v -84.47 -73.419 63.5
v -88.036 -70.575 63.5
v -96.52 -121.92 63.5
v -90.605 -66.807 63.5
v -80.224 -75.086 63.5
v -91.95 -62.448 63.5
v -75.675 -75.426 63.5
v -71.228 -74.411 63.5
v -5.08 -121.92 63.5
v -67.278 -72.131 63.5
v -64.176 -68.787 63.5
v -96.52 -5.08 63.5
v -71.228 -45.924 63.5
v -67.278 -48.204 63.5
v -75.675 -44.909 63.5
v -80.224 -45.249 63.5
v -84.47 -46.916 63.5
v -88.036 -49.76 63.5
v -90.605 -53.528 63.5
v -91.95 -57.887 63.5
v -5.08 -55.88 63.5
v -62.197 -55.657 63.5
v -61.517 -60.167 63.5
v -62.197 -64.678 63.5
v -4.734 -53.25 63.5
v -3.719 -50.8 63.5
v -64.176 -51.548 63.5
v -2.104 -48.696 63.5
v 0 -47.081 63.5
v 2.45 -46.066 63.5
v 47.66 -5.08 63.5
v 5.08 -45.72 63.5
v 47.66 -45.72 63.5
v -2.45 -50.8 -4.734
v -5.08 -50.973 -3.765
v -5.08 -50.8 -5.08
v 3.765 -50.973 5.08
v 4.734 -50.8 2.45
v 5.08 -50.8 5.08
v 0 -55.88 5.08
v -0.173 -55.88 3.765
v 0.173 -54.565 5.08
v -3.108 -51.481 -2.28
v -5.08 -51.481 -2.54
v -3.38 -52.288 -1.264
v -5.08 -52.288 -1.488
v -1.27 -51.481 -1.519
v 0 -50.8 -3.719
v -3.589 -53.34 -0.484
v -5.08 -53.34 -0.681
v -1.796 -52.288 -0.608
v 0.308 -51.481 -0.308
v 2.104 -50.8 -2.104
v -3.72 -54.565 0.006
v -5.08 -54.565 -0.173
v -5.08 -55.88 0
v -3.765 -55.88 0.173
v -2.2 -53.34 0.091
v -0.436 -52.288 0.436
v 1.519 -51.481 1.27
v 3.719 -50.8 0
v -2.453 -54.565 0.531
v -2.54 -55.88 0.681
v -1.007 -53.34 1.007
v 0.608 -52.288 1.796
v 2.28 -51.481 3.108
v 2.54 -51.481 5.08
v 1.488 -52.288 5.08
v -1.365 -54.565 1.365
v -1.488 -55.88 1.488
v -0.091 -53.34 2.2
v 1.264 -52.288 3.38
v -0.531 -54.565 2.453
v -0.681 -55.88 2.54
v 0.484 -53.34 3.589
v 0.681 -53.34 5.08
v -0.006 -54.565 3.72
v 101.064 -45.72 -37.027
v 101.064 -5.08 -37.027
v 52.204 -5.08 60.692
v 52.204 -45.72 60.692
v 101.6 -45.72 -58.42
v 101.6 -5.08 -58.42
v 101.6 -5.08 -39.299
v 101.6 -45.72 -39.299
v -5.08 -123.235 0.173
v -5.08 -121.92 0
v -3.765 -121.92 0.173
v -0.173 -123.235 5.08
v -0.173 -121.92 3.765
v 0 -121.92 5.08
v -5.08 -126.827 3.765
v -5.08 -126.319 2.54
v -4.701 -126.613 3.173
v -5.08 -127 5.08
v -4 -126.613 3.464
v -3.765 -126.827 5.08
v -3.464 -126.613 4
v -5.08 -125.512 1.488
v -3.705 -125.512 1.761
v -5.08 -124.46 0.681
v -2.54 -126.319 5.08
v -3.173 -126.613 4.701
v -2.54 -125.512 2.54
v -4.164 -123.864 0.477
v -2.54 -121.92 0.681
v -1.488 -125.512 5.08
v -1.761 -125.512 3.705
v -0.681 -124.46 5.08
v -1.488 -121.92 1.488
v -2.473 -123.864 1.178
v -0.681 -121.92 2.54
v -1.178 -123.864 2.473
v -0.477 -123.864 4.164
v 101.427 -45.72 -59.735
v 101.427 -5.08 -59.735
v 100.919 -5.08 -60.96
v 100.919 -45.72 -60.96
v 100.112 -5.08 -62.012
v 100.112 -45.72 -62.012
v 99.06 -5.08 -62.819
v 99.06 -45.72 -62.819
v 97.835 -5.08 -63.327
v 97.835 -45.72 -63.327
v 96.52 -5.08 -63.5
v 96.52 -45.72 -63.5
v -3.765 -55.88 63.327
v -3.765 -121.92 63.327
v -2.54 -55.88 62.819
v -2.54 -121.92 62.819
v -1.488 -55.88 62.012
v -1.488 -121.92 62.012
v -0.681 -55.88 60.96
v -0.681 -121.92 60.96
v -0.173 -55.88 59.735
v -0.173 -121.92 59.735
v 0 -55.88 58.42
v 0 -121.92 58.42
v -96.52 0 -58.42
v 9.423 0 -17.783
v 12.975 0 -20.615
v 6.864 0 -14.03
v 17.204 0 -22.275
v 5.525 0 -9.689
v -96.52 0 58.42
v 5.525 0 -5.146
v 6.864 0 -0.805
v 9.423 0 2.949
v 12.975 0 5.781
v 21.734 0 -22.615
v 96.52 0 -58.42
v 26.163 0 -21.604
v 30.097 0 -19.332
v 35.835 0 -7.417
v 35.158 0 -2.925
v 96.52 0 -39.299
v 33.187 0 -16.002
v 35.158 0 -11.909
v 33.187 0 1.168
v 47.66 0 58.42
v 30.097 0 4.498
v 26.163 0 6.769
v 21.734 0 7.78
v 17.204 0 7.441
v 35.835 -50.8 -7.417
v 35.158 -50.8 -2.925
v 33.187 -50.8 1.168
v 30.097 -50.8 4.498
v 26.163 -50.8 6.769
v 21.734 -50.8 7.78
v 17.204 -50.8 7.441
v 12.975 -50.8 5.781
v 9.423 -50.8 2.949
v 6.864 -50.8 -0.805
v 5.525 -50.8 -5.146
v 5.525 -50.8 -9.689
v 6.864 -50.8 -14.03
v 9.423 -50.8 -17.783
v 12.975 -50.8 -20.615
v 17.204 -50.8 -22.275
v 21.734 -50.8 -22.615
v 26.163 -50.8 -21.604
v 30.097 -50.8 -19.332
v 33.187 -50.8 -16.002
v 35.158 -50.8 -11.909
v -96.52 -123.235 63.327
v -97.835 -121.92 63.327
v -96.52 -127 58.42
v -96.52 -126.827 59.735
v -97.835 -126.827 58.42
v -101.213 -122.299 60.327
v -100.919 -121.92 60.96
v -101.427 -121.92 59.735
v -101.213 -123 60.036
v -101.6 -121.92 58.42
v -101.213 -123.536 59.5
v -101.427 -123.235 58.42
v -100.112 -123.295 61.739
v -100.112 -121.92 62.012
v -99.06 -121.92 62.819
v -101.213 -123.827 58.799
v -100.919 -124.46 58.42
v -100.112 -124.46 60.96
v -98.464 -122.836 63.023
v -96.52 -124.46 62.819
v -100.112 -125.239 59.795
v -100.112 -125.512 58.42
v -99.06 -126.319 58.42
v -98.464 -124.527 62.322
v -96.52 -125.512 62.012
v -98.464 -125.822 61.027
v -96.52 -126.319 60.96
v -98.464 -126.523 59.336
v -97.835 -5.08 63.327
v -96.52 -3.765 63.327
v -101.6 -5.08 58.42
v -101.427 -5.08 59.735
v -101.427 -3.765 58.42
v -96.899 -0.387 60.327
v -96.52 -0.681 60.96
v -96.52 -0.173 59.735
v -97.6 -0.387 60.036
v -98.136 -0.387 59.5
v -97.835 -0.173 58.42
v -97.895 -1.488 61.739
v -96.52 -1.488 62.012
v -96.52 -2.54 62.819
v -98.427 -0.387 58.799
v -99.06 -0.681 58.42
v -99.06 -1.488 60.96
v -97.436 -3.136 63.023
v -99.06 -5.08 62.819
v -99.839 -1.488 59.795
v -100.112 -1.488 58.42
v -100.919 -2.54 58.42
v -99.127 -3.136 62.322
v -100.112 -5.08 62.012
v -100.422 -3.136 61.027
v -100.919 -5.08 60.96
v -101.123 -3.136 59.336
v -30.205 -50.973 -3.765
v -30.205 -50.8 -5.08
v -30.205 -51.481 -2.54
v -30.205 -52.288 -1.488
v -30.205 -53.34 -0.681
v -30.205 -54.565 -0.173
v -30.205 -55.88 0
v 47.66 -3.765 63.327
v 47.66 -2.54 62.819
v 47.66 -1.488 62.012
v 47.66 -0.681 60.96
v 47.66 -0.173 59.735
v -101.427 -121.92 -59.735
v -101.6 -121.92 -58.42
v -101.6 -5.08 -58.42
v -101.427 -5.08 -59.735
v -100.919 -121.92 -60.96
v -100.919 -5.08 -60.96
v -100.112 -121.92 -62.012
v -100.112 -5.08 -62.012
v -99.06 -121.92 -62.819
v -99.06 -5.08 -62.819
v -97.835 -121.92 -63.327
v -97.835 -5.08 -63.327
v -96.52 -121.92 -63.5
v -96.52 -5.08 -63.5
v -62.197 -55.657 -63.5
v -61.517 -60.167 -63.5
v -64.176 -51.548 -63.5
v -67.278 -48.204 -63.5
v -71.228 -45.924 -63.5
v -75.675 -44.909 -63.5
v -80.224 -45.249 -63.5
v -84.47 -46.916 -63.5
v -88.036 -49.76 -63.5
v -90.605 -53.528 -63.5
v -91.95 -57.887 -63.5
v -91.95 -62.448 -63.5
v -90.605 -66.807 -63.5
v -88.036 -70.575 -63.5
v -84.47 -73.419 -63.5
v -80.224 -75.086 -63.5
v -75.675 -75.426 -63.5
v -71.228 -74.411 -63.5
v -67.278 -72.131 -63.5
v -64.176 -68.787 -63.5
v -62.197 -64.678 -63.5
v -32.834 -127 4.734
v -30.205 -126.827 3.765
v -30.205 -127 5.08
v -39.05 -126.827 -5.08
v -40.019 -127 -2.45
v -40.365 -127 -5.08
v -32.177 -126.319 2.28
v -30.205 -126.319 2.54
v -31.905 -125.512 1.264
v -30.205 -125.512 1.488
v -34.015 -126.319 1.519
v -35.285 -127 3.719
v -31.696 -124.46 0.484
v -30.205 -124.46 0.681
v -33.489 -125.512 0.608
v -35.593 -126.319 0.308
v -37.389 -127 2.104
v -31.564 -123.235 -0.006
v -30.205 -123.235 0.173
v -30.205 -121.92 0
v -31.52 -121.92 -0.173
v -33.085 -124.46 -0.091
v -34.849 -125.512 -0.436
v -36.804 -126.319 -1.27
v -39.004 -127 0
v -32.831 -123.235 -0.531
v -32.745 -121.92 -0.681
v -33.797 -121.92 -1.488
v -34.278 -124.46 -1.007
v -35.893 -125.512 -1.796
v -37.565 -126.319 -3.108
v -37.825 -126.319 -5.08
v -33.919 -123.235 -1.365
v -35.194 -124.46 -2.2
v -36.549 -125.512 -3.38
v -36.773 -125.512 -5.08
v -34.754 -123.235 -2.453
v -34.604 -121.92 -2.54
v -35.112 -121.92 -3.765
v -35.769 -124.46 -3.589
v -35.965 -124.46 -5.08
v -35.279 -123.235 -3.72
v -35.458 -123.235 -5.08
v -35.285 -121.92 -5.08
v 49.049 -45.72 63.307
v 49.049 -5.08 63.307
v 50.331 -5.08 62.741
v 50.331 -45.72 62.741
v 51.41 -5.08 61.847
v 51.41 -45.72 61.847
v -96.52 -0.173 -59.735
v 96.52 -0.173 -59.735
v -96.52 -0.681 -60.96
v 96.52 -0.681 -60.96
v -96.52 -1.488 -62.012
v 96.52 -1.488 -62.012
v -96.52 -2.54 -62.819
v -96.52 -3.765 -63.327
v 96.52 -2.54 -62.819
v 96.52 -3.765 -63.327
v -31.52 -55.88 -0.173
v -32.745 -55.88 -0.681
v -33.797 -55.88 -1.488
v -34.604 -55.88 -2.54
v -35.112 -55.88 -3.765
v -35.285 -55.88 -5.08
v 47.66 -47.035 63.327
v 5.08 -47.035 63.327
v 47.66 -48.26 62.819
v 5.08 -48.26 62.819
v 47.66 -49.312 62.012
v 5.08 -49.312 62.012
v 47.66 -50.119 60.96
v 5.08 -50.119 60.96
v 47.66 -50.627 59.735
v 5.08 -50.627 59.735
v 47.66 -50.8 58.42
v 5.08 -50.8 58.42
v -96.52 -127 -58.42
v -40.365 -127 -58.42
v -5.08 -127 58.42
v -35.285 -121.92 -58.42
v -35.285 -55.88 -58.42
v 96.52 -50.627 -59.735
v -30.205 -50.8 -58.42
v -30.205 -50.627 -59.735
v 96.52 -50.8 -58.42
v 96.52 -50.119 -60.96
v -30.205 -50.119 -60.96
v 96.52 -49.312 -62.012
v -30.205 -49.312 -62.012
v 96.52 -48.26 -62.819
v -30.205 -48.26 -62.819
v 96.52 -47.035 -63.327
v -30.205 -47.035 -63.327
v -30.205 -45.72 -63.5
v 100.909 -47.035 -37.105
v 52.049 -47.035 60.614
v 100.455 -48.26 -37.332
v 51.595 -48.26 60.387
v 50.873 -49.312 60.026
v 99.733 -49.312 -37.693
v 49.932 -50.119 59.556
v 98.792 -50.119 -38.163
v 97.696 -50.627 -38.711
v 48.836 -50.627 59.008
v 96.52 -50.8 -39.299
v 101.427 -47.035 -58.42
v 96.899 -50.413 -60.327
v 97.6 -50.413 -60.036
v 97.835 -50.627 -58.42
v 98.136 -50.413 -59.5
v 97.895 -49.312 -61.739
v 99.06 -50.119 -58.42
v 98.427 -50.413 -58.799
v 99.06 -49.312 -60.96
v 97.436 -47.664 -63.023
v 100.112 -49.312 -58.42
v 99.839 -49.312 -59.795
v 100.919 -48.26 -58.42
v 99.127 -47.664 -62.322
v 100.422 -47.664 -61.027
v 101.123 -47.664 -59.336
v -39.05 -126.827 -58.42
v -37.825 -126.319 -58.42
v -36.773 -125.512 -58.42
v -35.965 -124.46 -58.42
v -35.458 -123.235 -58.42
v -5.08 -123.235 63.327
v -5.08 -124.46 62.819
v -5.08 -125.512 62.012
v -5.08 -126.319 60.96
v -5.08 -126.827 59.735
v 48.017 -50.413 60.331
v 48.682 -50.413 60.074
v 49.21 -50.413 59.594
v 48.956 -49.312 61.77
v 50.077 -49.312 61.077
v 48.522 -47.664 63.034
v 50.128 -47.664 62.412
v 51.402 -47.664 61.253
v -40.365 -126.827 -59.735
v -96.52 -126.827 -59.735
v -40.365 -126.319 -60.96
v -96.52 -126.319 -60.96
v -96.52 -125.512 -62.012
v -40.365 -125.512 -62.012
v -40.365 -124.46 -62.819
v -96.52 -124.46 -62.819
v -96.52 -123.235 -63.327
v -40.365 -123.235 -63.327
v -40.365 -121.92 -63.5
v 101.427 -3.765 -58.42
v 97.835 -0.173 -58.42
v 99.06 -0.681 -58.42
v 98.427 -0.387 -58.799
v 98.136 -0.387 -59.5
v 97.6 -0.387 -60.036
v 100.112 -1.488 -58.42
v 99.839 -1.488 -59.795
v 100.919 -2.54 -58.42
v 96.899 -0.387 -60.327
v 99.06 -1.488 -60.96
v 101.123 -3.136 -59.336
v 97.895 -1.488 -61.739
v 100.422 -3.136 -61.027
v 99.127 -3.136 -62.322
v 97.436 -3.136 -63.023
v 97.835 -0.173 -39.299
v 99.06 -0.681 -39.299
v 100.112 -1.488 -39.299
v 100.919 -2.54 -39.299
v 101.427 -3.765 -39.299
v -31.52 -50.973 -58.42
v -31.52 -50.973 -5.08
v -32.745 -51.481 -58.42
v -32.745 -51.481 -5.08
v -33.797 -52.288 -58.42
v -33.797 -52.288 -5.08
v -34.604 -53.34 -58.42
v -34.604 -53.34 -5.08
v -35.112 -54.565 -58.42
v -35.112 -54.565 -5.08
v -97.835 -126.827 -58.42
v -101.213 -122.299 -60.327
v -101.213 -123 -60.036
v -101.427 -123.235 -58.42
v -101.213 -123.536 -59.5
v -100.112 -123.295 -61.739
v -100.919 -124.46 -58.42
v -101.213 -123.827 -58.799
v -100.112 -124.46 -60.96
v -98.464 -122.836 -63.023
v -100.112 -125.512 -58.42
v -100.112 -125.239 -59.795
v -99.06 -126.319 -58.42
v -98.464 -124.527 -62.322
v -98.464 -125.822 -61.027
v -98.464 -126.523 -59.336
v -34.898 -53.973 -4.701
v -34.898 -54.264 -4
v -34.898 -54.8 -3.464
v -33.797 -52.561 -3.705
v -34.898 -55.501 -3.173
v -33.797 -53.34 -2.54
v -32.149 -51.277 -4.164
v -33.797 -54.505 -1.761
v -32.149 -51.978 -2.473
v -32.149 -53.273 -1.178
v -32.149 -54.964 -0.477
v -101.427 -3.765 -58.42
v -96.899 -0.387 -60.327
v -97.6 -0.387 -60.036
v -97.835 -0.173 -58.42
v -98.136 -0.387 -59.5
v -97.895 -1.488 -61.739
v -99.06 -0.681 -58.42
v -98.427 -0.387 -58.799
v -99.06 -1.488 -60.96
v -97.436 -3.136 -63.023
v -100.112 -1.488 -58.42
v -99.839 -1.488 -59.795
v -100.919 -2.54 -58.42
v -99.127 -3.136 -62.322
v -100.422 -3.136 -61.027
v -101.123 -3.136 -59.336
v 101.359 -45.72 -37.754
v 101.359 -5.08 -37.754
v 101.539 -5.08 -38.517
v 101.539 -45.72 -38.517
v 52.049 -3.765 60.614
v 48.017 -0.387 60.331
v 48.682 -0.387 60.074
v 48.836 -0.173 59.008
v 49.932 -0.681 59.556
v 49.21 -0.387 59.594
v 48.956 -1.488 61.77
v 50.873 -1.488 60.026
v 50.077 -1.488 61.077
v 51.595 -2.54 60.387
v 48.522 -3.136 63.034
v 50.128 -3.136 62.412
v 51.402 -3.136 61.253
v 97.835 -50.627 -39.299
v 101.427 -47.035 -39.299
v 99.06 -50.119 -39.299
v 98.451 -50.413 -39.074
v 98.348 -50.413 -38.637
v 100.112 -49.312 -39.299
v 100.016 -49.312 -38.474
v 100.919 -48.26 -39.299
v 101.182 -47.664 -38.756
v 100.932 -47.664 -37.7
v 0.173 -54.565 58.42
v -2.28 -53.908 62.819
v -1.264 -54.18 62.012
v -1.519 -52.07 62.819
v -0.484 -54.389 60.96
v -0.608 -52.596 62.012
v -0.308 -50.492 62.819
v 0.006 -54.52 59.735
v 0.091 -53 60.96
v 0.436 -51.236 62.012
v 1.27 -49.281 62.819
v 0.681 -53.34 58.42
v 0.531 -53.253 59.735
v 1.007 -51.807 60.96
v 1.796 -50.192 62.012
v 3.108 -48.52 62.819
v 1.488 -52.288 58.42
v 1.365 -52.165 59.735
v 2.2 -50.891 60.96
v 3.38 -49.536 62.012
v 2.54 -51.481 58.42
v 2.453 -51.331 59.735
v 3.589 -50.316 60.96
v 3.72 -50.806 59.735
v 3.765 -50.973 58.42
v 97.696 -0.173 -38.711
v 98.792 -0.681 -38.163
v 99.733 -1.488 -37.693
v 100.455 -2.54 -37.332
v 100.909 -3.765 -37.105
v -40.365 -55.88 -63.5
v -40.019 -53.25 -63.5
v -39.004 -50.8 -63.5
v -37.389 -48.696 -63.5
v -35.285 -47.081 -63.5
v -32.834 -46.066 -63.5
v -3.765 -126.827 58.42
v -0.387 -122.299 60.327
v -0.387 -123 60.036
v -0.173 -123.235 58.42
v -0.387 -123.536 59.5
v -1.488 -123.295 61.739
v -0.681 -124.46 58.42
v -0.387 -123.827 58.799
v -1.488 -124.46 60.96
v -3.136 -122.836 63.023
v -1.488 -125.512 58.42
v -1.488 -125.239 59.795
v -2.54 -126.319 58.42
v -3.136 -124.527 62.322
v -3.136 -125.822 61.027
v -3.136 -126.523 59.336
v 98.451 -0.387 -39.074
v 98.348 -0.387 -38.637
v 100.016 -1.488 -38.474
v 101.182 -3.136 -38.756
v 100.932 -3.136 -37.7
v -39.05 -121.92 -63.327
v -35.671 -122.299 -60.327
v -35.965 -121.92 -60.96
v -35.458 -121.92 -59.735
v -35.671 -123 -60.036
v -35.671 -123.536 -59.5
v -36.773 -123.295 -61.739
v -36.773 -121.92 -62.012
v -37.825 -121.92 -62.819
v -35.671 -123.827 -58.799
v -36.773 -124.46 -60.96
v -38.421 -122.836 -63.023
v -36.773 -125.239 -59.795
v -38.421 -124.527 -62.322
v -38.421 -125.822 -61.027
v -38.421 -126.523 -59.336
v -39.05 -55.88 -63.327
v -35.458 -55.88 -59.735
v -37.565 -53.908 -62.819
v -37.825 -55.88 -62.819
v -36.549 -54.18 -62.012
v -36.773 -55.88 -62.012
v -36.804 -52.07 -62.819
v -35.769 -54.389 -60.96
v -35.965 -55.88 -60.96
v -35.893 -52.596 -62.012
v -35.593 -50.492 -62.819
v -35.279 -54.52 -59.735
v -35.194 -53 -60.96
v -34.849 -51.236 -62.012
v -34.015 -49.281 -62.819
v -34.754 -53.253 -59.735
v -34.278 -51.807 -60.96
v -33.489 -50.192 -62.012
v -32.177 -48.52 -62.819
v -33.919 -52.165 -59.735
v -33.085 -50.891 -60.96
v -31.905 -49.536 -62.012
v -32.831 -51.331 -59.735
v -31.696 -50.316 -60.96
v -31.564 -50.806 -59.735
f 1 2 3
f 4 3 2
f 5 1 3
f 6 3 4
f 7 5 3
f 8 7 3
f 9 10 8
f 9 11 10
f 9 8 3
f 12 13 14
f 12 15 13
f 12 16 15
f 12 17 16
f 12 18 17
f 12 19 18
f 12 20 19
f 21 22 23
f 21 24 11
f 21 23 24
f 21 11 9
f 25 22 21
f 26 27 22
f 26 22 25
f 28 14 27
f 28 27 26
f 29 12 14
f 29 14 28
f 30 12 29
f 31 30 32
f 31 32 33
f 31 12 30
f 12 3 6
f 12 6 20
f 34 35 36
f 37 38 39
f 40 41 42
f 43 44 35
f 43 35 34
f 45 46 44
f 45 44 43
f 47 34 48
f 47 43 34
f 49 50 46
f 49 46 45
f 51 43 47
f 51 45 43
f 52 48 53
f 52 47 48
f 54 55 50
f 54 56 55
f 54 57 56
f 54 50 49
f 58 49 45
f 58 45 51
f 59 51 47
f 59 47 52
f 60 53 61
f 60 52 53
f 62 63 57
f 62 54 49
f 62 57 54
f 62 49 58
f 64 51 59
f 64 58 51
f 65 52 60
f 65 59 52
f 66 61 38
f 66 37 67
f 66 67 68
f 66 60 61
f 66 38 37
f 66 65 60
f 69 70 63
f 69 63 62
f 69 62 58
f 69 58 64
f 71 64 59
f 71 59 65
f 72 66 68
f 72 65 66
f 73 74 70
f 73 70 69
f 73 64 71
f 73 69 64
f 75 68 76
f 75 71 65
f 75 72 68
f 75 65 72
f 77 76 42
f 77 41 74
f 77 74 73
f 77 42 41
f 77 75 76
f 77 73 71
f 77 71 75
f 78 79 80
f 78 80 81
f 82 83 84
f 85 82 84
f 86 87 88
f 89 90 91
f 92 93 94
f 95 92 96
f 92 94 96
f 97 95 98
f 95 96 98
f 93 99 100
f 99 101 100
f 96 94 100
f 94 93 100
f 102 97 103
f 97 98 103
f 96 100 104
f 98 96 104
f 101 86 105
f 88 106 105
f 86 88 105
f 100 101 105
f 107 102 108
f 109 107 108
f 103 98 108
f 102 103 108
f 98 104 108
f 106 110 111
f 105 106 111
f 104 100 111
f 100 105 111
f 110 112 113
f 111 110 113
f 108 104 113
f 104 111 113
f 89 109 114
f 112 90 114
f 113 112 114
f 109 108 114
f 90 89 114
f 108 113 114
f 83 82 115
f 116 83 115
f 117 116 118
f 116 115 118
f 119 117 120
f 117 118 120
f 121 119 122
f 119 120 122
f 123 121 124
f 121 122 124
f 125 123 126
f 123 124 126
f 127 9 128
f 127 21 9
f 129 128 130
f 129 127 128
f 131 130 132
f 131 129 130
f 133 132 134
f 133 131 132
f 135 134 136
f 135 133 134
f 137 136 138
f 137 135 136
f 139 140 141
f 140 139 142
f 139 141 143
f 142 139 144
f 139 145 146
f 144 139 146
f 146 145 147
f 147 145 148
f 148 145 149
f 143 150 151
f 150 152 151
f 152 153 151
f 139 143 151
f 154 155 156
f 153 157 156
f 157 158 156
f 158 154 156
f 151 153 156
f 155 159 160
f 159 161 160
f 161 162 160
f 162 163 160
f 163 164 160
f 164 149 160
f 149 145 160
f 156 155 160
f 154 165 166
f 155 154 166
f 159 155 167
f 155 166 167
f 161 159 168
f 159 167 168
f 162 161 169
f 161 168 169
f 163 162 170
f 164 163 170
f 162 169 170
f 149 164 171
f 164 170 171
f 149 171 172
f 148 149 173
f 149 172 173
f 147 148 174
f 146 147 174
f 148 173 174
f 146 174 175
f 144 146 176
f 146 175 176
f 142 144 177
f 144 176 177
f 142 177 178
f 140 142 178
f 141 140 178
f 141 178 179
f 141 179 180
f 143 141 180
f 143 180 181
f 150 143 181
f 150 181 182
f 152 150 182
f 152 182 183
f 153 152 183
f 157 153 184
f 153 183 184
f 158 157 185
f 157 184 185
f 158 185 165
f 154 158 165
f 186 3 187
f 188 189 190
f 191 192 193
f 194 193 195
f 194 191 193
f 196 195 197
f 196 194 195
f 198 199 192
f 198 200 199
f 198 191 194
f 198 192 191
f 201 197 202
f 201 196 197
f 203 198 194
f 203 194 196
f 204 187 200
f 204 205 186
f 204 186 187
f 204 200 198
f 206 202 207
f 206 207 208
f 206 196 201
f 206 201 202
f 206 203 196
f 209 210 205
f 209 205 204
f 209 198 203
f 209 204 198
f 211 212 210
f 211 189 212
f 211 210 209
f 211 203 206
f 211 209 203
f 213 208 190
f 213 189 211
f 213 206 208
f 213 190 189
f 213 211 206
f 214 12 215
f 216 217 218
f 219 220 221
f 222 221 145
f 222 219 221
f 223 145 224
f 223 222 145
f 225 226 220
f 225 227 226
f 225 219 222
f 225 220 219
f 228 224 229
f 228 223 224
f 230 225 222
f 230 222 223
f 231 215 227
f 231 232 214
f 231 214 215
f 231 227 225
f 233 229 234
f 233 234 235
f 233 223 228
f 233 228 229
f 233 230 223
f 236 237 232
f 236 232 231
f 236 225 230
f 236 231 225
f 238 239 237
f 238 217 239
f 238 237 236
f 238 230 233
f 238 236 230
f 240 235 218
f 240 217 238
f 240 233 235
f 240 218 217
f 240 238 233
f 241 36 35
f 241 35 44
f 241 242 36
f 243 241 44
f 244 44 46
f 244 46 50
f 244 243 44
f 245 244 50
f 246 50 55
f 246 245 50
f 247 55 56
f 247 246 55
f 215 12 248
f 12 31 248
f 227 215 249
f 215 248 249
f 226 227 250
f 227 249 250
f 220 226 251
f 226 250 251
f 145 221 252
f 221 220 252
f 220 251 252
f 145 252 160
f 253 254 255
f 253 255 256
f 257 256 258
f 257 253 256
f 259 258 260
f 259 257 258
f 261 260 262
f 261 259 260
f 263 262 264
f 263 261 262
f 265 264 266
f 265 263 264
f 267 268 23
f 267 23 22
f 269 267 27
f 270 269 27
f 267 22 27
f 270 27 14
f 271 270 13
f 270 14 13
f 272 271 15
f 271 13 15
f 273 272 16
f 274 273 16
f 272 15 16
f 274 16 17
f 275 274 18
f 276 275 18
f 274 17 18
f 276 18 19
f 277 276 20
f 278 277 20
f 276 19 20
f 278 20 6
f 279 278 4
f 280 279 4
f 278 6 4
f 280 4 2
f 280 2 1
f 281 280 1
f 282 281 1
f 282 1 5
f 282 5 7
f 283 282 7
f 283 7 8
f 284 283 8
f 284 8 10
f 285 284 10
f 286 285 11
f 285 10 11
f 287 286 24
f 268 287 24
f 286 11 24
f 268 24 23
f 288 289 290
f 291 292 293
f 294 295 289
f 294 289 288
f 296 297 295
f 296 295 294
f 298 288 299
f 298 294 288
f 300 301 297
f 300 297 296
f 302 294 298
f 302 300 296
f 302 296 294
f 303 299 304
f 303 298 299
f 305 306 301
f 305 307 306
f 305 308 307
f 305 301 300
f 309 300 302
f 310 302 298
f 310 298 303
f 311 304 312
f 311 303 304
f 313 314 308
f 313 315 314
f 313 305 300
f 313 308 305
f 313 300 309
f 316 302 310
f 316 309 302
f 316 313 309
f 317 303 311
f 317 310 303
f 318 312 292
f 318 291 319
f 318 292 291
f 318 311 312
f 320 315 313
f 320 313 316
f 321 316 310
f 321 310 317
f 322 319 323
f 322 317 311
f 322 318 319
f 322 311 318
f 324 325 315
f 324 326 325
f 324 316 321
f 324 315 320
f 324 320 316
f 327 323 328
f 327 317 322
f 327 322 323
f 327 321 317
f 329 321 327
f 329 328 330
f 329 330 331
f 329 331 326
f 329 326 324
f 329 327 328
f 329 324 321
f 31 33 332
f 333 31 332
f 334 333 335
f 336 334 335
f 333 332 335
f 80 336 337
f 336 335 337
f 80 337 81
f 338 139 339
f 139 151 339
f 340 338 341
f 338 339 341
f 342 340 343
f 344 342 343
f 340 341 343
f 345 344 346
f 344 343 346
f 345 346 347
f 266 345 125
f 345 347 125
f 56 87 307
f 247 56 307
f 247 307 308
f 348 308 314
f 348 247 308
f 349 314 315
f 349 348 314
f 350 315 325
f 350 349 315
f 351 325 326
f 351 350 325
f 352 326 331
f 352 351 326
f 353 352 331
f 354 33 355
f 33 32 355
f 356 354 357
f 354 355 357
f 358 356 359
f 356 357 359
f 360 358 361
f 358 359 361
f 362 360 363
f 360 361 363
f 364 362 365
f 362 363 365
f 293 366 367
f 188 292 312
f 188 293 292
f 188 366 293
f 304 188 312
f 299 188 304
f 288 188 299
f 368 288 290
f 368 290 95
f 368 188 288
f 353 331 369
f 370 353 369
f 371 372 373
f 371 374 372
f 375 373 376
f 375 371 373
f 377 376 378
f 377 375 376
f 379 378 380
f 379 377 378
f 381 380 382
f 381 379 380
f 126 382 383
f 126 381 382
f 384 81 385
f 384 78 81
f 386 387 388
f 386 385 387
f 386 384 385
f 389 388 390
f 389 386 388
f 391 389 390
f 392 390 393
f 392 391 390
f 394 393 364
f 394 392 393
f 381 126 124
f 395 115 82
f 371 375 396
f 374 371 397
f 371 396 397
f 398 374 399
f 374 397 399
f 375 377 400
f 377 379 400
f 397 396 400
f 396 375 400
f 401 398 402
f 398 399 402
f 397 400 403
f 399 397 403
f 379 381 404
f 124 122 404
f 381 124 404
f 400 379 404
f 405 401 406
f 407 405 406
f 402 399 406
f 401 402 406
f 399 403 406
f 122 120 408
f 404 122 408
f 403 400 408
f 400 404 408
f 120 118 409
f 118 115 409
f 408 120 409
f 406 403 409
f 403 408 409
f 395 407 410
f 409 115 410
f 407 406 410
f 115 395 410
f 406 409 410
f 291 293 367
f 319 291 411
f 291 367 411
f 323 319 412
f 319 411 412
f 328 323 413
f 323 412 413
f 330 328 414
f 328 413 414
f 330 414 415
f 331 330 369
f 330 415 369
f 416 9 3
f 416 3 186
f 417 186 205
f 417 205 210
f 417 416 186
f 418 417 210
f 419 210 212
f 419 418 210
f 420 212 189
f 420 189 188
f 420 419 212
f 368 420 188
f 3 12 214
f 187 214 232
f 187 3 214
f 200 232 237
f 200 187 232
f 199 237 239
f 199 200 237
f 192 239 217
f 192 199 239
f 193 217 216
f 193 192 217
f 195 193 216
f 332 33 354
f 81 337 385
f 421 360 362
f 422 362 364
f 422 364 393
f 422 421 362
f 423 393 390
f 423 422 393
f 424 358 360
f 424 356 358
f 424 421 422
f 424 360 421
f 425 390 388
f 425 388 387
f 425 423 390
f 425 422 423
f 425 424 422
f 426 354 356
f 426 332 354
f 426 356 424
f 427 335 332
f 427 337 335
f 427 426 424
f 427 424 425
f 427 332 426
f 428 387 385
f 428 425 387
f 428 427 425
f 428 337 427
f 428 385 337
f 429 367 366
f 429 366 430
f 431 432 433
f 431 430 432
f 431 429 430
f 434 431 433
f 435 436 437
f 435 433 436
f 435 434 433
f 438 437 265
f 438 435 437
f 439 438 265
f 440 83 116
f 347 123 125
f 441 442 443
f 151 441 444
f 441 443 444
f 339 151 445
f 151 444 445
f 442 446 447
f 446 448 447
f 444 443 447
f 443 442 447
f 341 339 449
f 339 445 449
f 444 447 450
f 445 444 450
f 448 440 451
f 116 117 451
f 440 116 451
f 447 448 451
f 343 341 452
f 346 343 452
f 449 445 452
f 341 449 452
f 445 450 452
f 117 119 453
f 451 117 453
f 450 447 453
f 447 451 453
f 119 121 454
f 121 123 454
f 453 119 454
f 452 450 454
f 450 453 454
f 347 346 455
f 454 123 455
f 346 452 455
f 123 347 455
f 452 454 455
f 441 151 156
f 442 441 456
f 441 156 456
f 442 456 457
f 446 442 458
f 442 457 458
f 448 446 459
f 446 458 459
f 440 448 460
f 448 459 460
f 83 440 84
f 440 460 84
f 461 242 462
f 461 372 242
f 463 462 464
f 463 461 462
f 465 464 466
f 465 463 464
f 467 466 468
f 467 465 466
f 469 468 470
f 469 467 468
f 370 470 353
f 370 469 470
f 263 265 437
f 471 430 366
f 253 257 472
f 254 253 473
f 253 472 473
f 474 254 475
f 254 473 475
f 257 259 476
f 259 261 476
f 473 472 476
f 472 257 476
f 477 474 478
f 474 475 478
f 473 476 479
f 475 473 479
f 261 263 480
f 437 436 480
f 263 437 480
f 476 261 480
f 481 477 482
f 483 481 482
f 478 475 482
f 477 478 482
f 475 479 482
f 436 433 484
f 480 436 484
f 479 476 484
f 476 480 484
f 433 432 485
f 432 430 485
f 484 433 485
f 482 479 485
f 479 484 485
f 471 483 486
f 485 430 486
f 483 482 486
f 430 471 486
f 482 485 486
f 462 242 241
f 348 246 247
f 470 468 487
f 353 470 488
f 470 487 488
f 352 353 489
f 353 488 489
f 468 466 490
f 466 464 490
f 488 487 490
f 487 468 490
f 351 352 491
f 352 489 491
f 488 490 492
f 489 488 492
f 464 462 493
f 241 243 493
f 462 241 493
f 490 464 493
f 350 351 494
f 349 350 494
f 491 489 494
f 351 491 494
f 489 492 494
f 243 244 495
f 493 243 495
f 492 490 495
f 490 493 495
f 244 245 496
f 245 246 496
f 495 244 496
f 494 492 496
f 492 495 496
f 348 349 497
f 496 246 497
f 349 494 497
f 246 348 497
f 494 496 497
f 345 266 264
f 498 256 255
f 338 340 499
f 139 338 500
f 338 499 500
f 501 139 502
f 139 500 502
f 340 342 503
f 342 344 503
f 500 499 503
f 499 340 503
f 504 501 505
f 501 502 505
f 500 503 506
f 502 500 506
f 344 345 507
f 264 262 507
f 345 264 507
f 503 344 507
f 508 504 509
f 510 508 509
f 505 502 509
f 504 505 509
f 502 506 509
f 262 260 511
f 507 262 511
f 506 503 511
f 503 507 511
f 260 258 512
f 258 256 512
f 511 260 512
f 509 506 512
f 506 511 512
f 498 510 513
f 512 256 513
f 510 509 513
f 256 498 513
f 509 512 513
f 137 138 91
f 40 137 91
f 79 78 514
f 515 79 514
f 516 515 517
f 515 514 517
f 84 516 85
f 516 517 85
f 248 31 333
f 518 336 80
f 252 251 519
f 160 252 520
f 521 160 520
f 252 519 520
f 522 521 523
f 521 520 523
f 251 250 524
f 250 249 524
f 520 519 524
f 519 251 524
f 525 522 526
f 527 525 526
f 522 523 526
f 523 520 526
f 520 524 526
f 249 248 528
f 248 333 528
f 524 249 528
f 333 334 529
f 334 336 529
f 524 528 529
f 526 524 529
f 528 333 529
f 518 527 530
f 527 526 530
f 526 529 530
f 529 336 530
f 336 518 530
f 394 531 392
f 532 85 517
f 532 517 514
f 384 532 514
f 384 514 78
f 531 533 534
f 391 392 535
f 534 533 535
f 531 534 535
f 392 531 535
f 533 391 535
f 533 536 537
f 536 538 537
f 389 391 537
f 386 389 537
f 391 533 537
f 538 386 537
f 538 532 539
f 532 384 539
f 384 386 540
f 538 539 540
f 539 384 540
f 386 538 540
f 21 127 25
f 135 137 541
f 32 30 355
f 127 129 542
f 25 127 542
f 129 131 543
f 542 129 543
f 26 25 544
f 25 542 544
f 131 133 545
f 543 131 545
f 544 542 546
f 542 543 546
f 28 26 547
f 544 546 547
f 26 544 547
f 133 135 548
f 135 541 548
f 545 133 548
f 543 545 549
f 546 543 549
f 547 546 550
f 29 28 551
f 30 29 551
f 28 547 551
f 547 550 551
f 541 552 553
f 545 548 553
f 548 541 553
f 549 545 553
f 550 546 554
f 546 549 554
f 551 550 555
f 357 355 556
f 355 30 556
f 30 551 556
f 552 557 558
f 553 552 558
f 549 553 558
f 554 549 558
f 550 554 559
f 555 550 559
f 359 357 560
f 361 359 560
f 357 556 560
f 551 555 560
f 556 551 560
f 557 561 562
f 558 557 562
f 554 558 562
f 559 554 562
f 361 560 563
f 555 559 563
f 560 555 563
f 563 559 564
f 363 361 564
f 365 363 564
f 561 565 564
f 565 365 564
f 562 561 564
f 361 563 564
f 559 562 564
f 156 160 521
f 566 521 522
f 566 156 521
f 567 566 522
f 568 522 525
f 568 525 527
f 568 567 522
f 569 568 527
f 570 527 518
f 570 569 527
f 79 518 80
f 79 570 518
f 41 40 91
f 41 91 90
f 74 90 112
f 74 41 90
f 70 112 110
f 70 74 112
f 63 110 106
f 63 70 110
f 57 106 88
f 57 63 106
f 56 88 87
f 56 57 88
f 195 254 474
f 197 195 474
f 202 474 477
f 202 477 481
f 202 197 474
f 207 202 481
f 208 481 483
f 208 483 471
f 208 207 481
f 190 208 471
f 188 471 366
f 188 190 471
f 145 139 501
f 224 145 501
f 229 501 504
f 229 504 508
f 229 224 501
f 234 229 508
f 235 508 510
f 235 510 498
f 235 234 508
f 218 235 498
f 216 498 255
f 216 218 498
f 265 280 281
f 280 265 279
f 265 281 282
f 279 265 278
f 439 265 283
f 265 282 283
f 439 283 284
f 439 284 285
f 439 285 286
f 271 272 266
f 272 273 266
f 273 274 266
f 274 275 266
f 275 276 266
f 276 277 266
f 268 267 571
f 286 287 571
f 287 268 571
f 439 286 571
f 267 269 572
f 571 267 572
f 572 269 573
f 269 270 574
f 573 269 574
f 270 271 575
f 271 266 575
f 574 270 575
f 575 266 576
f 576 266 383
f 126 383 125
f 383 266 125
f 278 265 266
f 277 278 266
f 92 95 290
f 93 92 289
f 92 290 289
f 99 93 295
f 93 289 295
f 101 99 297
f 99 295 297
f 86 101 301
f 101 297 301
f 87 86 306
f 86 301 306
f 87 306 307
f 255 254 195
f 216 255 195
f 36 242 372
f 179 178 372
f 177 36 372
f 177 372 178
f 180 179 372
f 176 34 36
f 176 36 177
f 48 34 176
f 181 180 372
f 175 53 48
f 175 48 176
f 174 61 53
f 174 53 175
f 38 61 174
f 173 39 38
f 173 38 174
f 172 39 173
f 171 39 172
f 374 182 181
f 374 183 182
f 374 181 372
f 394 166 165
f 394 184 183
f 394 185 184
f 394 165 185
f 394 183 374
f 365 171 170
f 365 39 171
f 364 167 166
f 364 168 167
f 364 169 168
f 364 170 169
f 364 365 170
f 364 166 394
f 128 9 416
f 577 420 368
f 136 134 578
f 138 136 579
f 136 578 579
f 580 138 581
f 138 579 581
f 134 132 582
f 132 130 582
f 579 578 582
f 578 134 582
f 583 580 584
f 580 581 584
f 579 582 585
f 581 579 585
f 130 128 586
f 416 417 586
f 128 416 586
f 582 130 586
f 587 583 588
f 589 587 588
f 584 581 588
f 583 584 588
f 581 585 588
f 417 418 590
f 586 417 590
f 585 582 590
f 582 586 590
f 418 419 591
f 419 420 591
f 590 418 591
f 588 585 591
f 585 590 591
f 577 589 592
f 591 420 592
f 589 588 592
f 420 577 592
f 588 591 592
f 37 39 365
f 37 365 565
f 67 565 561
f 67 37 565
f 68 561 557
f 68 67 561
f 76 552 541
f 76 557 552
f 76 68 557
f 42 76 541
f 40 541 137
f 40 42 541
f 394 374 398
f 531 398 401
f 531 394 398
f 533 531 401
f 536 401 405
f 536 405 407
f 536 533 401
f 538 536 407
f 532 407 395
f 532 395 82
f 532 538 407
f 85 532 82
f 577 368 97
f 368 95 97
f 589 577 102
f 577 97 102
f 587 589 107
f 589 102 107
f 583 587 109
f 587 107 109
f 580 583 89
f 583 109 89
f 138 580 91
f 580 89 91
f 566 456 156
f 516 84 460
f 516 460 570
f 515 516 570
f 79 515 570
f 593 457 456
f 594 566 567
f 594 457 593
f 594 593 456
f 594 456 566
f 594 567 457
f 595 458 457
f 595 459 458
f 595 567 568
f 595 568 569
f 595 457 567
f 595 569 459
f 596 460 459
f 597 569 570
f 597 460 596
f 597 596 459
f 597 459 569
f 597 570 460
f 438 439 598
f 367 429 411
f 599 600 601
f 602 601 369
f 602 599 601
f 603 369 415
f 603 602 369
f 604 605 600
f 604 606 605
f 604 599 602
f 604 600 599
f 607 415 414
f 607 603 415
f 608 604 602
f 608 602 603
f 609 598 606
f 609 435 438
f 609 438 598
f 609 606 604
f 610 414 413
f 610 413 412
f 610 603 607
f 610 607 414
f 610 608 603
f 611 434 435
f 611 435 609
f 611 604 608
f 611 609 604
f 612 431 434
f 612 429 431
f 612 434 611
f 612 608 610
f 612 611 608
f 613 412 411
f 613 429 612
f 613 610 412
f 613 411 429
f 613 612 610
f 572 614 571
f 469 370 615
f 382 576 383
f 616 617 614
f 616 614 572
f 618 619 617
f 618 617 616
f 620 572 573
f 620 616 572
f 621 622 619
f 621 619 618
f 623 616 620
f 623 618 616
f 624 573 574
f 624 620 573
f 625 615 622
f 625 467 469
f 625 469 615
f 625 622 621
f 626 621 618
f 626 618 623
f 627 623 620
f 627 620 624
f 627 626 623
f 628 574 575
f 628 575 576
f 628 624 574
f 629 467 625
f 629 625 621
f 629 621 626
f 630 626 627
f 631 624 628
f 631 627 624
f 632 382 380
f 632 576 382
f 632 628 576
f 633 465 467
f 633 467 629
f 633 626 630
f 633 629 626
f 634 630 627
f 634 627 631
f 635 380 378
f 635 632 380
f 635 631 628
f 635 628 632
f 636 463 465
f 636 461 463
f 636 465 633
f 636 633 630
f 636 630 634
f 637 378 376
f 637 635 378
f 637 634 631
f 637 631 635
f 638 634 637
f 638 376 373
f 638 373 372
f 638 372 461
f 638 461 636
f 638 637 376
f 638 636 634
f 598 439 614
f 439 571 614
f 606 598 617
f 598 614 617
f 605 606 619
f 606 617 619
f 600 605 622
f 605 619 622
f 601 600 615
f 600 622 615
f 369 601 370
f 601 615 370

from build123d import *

# Parameters (mm, degrees)
F0_W     = 203.2
F0_H     = 127
F1_DEPTH = 127
F3_DEPTH = 76.2
F4_SIZE2 = 101.6
F4_SIZE  = 50.8
F5_R     = 5.08
F6_R     = 15.24
F7_DEPTH = 50.8
F8_R     = 15.301727391
F9_DEPTH = 127


with BuildPart() as f1:
    # F0 (on Front) → F1 (new body)
    with BuildSketch(Plane.XZ):
        Rectangle(F0_W, F0_H)
    extrude(amount=F1_DEPTH)

    # F2 (on face) → F3 (cut)
    with BuildSketch(Plane.XZ.offset(127)):
        Polygon((101.6, 63.5), (0, 63.5), (0, 0), (-35.2848060429, 0), (-35.2848060429, -63.5), (101.6, -63.5), align=None)
    extrude(amount=-F3_DEPTH, mode=Mode.SUBTRACT)

    # F4
    f4_edges = [f1.edges().sort_by_distance(p)[0] for p in [
        (101.6, -25.4, 63.5),
    ]]
    f4_side = f1.faces().sort_by_distance((-21.771429, -52.614286, 63.5))[0]
    chamfer(f4_edges, length=F4_SIZE, length2=F4_SIZE2, reference=f4_side)

    # F5
    f5_edges = [f1.edges().sort_by_distance(p)[0] for p in [
        (-50.8, -127, 63.5),
        (0, -88.9, 63.5),
        (76.2, -50.8, 12.7),
        (-101.6, -63.5, 63.5),
        (-25.4, 0, 63.5),
        (76.2, 0, 12.7),
        (-68.442403, -127, -63.5),
        (101.6, -25.4, -63.5),
        (50.8, -25.4, 63.5),
        (25.4, -50.8, 63.5),
        (0, -88.9, 0),
        (-35.284806, -88.9, -63.5),
        (-17.642403, -127, 0),
        (33.157597, -50.8, -63.5),
        (101.6, -25.4, -38.1),
        (-101.6, -63.5, -63.5),
        (101.6, 0, -50.8),
        (-17.642403, -50.8, 0),
        (0, -127, 31.75),
        (-35.284806, -127, -31.75),
        (0, 0, -63.5),
        (0, -50.8, 31.75),
        (-35.284806, -50.8, -31.75),
        (-101.6, -127, 0),
        (-101.6, 0, 0),
        (-35.284806, -88.9, 0),
        (101.6, -50.8, -50.8),
    ]]
    fillet(f5_edges, radius=F5_R)

    # F6 (on face) → F7 (cut, through all)
    with BuildSketch(Plane.XZ.offset(50.8)):
        with Locations((20.5951939571, -7.4171987902)):
            Circle(F6_R)
    extrude(amount=-F7_DEPTH, mode=Mode.SUBTRACT)

    # F8 (on face) → F9 (cut, through all)
    with BuildSketch(Plane.XY.offset(63.5)):
        with Locations((-76.8187716603, -60.167491436)):
            Circle(F8_R)
    extrude(amount=-F9_DEPTH, mode=Mode.SUBTRACT)


solid = f1.part
